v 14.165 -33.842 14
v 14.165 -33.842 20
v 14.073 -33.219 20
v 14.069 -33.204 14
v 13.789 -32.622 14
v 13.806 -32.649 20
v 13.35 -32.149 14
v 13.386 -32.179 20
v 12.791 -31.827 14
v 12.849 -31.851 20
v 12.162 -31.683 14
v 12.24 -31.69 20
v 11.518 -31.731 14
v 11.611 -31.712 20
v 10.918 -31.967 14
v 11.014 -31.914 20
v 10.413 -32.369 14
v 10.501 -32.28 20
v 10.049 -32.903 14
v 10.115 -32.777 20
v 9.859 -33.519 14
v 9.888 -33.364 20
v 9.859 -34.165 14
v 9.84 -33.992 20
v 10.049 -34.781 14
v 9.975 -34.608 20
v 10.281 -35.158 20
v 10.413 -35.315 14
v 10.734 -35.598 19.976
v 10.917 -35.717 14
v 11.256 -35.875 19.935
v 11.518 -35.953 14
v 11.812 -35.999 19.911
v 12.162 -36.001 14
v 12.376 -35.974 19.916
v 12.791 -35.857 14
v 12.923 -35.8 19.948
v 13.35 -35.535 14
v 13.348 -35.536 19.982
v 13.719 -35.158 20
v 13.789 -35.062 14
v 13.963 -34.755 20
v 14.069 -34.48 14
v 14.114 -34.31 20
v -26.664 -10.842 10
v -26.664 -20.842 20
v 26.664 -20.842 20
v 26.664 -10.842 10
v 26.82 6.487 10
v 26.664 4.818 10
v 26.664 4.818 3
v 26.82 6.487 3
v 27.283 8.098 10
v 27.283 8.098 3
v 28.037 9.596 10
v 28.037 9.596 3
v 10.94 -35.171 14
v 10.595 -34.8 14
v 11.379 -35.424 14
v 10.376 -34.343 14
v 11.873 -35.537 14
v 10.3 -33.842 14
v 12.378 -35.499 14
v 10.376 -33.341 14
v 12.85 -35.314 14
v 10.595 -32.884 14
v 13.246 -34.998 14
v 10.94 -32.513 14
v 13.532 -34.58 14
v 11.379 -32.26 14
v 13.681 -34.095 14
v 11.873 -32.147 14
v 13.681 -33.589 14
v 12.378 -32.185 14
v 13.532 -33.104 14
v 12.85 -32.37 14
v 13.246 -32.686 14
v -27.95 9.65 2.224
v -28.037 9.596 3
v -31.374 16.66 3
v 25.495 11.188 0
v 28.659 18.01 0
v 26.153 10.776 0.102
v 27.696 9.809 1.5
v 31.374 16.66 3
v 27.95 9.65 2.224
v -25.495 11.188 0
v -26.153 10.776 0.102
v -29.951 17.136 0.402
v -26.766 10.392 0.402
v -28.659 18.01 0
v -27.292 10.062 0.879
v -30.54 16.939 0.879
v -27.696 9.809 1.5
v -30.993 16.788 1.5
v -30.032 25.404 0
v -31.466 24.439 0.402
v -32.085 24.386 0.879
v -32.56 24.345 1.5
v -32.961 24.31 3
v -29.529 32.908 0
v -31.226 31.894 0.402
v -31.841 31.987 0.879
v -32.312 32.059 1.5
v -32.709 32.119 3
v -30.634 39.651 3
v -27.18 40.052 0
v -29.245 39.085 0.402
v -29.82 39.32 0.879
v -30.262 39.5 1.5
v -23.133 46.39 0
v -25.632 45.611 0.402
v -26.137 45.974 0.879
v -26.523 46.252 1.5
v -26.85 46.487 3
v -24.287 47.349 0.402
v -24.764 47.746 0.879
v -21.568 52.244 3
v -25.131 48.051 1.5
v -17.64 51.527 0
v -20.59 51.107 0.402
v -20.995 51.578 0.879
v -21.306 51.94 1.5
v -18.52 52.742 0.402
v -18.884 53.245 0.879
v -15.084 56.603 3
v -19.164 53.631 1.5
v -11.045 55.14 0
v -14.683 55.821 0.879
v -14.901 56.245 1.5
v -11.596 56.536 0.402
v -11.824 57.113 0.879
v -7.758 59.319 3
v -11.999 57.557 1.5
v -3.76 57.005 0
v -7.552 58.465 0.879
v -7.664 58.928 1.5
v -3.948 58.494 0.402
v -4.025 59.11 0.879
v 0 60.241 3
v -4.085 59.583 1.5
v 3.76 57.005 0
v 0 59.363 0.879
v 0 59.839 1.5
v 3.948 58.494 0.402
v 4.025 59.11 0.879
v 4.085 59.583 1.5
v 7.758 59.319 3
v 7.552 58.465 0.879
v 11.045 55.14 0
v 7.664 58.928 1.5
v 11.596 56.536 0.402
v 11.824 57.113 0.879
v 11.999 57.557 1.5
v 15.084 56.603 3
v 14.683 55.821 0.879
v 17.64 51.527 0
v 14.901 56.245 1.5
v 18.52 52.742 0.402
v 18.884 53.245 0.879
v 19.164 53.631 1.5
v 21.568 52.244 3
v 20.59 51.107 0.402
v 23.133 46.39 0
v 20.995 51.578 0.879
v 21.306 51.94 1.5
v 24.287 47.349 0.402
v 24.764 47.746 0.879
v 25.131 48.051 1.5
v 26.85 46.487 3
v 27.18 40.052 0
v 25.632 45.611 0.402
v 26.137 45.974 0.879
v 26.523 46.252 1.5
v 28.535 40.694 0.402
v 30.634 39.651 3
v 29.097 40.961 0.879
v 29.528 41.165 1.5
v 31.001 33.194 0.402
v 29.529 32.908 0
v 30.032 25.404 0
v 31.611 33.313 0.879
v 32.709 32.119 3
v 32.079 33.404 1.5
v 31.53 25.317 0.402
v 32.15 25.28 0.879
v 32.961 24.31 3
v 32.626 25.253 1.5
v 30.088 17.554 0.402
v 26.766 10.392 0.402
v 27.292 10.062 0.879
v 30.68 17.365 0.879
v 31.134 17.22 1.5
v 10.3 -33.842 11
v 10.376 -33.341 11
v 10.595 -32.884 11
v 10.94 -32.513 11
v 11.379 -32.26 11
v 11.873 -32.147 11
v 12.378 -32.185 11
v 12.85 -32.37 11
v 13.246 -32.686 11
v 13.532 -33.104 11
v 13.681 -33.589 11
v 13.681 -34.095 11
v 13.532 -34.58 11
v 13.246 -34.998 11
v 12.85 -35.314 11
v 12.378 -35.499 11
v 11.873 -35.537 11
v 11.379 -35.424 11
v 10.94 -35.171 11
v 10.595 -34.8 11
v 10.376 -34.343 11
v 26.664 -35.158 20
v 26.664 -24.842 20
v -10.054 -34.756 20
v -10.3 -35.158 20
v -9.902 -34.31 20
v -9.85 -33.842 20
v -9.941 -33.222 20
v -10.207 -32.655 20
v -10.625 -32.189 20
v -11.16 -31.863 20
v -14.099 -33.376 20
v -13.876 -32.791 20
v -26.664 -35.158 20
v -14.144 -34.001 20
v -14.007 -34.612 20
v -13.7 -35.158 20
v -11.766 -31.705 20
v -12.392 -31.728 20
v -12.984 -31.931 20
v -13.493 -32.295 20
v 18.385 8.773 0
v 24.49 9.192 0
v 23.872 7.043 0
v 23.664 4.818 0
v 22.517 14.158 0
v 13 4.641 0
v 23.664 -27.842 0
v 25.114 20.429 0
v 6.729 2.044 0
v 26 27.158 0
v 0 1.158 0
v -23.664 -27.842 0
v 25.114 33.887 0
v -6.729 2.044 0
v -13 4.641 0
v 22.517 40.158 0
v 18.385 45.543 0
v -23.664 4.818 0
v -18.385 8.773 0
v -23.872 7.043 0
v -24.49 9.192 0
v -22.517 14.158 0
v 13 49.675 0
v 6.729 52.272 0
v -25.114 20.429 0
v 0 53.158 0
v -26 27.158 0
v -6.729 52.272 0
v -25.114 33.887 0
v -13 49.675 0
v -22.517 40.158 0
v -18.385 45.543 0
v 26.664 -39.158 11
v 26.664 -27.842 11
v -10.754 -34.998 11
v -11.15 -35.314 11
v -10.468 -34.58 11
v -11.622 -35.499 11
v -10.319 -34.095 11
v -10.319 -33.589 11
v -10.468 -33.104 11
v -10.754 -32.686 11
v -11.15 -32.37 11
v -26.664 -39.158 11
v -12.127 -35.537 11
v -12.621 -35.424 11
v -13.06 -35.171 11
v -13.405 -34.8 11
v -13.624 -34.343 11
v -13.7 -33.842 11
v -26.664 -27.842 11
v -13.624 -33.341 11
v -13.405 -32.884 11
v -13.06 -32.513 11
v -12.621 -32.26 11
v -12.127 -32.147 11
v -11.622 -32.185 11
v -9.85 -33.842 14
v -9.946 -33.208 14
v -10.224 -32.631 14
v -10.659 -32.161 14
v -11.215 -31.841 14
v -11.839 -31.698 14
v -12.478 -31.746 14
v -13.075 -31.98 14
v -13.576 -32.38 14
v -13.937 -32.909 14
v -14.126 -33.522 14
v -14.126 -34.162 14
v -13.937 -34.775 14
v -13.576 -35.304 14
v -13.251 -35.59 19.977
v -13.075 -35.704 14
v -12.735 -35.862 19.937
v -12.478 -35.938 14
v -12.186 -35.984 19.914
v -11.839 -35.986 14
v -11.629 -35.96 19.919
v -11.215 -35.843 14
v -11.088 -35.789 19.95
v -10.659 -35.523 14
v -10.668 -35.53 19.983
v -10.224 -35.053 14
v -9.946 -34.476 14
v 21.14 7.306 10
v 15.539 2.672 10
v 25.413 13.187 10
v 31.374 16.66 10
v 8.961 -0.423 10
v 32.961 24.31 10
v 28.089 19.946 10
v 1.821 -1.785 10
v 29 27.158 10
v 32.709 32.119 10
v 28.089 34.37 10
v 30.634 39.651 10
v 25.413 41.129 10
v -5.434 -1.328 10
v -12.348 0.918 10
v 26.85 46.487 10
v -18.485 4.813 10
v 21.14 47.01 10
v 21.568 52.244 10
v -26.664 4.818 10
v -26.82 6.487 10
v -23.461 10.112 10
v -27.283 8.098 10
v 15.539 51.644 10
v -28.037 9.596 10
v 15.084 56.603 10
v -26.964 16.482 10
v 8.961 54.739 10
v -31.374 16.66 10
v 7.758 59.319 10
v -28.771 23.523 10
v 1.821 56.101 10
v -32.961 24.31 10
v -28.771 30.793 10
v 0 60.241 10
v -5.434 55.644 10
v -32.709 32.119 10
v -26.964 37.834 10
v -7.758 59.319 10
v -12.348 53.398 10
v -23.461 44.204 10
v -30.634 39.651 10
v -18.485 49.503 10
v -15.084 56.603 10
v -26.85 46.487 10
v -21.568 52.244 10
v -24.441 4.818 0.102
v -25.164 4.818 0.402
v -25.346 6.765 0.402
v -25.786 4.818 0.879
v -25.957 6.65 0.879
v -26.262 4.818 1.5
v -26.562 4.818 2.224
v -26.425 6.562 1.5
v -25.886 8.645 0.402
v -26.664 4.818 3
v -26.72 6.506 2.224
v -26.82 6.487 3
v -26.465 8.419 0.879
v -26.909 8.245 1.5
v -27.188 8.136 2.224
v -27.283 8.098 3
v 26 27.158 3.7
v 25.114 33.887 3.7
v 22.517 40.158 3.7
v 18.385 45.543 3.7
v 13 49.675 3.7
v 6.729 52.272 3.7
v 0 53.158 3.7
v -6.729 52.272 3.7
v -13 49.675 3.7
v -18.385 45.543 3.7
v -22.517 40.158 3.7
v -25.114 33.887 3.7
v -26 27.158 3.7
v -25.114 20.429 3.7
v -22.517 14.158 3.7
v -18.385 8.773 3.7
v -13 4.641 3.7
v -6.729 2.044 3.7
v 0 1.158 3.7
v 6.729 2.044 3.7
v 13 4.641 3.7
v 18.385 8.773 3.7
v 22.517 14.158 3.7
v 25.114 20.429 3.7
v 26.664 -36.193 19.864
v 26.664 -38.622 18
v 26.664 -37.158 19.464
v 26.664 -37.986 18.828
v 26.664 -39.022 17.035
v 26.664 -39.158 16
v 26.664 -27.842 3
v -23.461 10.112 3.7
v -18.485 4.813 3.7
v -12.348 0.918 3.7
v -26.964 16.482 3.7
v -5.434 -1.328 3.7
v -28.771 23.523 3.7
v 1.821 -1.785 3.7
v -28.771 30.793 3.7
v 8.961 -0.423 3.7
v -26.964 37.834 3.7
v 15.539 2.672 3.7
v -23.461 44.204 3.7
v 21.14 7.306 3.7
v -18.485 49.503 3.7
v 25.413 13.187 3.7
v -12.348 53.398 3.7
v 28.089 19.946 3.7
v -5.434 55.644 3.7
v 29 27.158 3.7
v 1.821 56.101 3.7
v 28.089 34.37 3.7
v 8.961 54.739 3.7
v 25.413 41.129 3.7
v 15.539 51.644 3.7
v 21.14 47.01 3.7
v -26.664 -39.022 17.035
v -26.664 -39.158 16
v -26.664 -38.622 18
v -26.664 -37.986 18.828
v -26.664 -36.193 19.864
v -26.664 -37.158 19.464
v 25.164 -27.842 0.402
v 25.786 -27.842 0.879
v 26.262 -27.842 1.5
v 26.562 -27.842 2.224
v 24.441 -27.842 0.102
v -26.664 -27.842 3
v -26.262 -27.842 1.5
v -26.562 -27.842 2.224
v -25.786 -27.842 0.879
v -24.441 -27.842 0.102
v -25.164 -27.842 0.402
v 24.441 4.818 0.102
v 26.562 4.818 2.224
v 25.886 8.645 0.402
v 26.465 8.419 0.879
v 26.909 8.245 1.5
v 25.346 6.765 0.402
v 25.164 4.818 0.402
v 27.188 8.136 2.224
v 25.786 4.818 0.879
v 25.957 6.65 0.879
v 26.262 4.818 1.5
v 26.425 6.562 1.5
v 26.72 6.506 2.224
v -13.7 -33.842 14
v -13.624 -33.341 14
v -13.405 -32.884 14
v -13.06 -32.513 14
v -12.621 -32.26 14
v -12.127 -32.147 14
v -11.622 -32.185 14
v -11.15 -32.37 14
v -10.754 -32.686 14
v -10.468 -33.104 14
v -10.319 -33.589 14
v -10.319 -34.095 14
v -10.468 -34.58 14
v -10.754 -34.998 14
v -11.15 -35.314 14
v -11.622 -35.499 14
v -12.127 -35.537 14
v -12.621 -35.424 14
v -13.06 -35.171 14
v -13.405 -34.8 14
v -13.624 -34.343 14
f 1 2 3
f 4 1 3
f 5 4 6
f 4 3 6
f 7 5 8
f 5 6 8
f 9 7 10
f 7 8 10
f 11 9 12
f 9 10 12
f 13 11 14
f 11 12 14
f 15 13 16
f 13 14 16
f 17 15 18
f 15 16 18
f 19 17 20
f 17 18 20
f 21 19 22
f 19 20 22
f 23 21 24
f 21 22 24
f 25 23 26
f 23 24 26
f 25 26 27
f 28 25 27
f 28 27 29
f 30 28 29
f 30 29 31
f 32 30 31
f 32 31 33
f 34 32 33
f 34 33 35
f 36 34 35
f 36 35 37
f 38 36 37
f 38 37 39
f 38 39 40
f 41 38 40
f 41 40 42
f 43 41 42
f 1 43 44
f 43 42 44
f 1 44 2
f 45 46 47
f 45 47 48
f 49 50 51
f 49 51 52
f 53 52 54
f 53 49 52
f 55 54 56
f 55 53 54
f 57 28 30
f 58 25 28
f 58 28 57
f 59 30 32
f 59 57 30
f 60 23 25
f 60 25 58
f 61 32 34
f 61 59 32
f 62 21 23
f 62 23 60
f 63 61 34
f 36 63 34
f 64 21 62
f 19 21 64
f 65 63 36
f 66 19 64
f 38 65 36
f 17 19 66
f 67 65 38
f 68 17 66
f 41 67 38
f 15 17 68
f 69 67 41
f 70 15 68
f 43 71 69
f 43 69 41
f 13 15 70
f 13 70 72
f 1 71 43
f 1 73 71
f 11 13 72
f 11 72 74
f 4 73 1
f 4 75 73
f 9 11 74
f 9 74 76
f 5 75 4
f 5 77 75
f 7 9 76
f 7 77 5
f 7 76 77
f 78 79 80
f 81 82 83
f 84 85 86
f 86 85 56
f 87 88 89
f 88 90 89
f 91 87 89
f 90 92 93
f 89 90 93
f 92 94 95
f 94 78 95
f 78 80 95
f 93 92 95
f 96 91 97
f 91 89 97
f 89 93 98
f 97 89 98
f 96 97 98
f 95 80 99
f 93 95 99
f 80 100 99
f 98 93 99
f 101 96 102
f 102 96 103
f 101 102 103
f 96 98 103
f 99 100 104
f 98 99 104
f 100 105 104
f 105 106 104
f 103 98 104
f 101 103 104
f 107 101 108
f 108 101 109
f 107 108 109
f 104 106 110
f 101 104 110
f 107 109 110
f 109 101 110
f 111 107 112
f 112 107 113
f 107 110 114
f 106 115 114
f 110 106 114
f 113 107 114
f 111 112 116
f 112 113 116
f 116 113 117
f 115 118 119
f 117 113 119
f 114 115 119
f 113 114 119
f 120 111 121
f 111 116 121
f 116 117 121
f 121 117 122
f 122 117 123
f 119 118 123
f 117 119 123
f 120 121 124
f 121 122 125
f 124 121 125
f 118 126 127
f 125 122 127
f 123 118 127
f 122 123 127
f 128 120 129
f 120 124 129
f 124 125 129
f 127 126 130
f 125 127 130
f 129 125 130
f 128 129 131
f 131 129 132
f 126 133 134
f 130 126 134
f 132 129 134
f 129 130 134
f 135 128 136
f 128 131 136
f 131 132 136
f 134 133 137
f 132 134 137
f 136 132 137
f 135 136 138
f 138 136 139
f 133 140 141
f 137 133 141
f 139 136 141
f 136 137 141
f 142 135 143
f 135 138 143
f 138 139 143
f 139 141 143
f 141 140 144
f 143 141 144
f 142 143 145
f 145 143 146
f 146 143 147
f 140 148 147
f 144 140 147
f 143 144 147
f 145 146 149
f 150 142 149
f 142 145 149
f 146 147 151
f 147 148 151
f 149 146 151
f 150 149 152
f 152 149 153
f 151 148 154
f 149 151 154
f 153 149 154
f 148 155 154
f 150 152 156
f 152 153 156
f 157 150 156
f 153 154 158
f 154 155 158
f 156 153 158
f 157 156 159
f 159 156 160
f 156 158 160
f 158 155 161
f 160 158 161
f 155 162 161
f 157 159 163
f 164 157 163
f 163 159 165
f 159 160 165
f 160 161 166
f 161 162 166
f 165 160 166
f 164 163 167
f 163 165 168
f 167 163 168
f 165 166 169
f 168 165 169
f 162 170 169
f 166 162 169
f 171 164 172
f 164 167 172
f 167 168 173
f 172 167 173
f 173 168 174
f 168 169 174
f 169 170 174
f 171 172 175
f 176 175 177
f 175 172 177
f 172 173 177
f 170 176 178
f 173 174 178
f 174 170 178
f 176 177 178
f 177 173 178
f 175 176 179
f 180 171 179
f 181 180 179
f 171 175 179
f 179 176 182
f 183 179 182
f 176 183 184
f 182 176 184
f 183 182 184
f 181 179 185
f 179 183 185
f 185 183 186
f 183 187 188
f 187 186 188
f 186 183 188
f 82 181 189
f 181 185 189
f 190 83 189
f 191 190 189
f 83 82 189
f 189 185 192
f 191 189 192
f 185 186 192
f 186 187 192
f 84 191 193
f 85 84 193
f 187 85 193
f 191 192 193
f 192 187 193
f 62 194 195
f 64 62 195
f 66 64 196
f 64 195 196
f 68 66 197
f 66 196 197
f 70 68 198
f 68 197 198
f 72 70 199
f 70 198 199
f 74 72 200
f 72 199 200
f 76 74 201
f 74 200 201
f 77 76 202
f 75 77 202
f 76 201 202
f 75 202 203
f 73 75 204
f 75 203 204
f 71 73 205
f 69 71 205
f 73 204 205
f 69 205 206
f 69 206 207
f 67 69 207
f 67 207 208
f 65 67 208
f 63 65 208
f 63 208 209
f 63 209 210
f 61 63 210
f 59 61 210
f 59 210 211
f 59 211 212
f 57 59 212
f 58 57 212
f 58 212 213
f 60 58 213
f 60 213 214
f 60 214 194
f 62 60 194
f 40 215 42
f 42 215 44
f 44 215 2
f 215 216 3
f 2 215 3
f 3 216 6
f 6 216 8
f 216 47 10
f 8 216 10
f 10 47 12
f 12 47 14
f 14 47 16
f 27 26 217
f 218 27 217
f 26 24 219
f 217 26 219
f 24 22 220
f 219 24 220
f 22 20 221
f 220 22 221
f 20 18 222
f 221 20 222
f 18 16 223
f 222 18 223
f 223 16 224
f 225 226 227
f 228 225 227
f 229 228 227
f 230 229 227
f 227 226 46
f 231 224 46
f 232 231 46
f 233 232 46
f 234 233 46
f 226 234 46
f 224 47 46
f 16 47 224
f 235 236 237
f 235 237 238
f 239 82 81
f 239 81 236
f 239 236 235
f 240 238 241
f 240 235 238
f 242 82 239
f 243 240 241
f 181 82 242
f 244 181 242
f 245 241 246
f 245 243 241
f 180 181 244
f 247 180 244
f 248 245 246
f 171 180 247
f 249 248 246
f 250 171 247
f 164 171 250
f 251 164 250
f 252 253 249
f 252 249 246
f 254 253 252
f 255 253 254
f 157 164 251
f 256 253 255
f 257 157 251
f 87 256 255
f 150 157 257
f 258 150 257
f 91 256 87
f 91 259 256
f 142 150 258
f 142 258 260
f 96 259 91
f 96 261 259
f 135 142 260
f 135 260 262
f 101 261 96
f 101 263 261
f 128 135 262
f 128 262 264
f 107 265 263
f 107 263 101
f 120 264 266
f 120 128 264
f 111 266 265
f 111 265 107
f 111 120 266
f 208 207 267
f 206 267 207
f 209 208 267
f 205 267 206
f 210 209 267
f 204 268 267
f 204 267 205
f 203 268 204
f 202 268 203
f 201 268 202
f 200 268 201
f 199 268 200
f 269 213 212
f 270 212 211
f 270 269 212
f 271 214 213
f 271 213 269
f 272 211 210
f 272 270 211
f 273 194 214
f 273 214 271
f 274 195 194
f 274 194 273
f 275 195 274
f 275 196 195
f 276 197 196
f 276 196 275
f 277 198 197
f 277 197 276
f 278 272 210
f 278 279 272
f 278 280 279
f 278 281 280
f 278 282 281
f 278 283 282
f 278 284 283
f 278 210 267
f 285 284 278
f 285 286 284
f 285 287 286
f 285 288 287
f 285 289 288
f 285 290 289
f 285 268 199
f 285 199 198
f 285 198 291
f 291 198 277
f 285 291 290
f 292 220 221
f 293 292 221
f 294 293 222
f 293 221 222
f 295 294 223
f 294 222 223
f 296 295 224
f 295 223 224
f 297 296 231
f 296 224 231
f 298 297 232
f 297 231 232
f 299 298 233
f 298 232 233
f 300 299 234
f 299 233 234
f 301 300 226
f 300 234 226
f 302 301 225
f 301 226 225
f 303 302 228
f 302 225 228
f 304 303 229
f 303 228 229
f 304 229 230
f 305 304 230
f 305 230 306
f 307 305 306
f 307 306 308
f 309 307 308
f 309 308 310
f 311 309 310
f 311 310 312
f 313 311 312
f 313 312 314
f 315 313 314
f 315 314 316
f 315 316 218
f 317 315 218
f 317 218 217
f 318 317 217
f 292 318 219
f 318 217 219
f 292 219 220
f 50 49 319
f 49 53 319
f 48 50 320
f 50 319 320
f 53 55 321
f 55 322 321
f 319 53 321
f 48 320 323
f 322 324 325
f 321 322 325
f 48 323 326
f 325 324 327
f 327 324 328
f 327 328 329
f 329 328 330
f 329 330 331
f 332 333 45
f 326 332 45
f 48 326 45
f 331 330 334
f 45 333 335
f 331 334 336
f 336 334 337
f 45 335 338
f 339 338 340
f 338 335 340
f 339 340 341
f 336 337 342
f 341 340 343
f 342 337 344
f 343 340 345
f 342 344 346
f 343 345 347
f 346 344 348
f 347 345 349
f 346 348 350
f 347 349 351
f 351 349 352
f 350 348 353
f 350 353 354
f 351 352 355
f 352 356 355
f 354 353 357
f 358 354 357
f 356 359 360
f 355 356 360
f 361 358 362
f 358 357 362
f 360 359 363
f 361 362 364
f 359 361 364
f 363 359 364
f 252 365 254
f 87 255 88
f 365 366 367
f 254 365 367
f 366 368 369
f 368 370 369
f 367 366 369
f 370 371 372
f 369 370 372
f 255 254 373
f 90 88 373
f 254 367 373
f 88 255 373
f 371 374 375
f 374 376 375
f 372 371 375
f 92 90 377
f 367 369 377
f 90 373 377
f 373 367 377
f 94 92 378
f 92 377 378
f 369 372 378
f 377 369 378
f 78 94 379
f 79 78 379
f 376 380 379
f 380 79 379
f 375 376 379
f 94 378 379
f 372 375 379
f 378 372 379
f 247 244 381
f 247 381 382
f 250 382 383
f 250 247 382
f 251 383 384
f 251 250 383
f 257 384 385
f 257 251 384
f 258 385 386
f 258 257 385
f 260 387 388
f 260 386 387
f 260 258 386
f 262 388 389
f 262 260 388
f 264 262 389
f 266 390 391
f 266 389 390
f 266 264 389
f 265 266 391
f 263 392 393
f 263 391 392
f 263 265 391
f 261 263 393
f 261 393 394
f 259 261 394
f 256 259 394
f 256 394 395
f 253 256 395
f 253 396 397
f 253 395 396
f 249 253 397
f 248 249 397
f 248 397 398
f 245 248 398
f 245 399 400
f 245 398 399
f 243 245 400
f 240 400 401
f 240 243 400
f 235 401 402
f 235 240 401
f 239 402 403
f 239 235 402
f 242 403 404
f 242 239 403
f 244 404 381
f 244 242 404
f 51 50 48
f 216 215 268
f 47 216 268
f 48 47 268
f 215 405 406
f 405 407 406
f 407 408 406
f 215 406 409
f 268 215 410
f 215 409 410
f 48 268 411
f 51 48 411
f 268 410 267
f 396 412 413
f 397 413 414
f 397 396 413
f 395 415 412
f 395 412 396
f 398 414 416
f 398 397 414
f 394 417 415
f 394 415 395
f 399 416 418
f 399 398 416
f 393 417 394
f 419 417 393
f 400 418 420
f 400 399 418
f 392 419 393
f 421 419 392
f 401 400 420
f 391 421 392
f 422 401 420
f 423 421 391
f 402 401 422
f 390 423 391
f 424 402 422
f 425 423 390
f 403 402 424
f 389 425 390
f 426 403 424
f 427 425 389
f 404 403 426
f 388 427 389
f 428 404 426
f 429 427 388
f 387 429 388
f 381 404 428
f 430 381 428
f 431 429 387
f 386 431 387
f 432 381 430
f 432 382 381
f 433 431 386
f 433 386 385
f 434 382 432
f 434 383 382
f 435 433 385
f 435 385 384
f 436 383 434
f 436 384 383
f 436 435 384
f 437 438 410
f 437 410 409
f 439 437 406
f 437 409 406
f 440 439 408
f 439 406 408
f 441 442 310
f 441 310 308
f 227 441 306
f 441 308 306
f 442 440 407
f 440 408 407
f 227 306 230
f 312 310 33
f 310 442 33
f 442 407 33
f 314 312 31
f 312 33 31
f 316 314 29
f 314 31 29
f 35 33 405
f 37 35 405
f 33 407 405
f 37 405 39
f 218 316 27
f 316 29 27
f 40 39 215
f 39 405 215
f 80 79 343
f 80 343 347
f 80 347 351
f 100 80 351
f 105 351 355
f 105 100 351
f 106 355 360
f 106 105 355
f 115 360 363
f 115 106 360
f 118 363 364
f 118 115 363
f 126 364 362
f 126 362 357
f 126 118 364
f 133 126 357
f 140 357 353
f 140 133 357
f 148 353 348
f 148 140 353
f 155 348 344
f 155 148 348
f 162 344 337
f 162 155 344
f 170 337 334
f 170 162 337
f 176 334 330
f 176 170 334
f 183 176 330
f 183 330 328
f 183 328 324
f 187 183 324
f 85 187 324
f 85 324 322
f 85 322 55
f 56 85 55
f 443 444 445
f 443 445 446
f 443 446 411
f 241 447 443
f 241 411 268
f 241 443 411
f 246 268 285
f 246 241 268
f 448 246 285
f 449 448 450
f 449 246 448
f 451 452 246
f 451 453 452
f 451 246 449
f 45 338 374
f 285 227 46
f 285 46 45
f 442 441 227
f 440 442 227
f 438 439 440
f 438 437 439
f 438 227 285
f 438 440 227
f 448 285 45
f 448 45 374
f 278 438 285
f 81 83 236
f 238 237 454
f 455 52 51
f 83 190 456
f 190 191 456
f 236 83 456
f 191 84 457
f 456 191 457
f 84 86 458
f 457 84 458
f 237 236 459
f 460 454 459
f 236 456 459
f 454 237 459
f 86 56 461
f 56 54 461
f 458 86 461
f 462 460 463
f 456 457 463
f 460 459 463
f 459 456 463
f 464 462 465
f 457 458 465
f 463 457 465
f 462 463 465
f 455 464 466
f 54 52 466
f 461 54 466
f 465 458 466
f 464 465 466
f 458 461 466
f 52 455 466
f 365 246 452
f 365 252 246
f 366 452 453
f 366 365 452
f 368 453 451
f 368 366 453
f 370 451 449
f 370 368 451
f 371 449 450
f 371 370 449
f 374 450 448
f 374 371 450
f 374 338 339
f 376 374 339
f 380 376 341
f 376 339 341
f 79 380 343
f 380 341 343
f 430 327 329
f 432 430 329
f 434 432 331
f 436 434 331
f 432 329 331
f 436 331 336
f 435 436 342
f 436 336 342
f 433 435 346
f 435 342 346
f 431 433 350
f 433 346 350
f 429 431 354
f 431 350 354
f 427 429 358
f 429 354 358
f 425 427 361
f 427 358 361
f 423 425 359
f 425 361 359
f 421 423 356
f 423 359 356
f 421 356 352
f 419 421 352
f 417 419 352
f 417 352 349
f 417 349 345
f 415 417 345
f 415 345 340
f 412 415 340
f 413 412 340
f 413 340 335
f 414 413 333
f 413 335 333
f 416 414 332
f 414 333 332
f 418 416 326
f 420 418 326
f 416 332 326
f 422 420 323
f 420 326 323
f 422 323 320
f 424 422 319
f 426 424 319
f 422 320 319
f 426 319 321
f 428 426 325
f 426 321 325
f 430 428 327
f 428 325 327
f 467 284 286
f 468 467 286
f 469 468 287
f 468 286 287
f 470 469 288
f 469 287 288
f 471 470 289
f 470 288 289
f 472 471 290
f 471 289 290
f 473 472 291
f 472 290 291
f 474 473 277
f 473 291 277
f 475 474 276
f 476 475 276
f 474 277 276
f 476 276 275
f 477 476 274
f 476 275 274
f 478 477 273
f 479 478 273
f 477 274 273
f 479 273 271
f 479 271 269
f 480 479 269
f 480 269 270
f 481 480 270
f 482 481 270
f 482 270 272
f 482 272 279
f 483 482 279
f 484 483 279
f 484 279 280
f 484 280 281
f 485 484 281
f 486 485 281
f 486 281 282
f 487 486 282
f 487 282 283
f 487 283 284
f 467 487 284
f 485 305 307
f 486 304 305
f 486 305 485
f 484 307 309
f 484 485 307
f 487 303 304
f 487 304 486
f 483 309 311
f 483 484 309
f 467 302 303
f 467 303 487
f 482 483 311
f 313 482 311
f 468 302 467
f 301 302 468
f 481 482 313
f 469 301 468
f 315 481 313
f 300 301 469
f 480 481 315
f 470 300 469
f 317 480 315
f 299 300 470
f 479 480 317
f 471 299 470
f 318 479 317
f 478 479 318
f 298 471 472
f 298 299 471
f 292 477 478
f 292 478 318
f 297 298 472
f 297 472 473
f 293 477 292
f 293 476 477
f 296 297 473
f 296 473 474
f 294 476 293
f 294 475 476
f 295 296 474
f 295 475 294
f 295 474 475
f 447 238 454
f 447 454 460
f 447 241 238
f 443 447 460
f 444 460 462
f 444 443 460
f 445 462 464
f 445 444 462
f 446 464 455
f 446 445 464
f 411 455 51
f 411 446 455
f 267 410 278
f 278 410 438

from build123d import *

# Parameters (mm, degrees)
SKETCH_1_R          = 26
EXTRUDE_1_DEPTH     = 10
SKETCH_3_R          = 29
CUT_EXTRUDE_1_DEPTH = 6.3
FILLET_1_R          = 9
SKETCH_4_W          = 53.328443722
SKETCH_4_H          = 11.316007496
EXTRUDE_2_DEPTH     = 10
SKETCH_5_W          = 53.328443722
SKETCH_5_H          = 11.316007496
EXTRUDE_3_DEPTH     = 2
SKETCH_6_W          = 53.328443722
SKETCH_6_H          = 10
EXTRUDE_4_DEPTH     = 3
CHAMFER_1_SIZE      = 14
FILLET_3_R          = 3
SKETCH_7_R          = 1.7
CUT_EXTRUDE_2_DEPTH = 14
SKETCH_8_R          = 2.15
SKETCH_8_R_2        = 2.165
CUT_EXTRUDE_3_DEPTH = 6
SKETCH_9_W          = 53.328443722
SKETCH_9_H          = 11.316007496
CUT_EXTRUDE_4_DEPTH = 3
FILLET_4_R          = 4


with BuildPart() as part:
    # 草图1 → 凸台-拉伸1 (new body)
    with BuildSketch(Plane.XY):
        with BuildLine():
            Line((26.664221861, -27.841996252), (-26.664221861, -27.841996252))
            Line((-26.664221861, -27.841996252), (-26.664221861, 7.574088737))
            ThreePointArc((-26.664221861, 7.574088737), (0, 60.241390131), (26.664221861, 7.574088737))
            Line((26.664221861, 7.574088737), (26.664221861, -27.841996252))
        make_face()
        with Locations((0, 27.158003748)):
            Circle(SKETCH_1_R, mode=Mode.SUBTRACT)
    extrude(amount=EXTRUDE_1_DEPTH)

    # 草图3 → 切除-拉伸1 (cut)
    with BuildSketch(Plane.XY.offset(10)):
        with Locations((0, 27.158003748)):
            Circle(SKETCH_3_R)
    extrude(amount=-CUT_EXTRUDE_1_DEPTH, mode=Mode.SUBTRACT)

    # 圆角1
    fillet_1_edges = [part.edges().sort_by_distance(p)[0] for p in [
        (-26.664221861, 7.574088737, 5),
        (26.664221861, 7.574088737, 5),
    ]]
    fillet(fillet_1_edges, radius=FILLET_1_R)



with BuildPart() as body_2:
    # 草图4 → 凸台-拉伸2 (new body)
    with BuildSketch(Plane.XY.offset(10)):
        with Locations((0, -33.5)):
            Rectangle(SKETCH_4_W, SKETCH_4_H)
    extrude(amount=EXTRUDE_2_DEPTH)


with BuildPart() as part_1:
    add(part.part)

    add(body_2.part)  # 凸台-拉伸3 merges body 2
    # 草图5 → 凸台-拉伸3 (add)
    with BuildSketch(Plane(origin=(0, 0, 10), x_dir=(-1, 0, 0), z_dir=(0, 0, -1))):
        with Locations((0, -33.5)):
            Rectangle(SKETCH_5_W, SKETCH_5_H)
    extrude(amount=EXTRUDE_3_DEPTH)

    # 草图6 → 凸台-拉伸4 (add)
    with BuildSketch(Plane(origin=(0, -27.841996252, 0), x_dir=(1, 0, 0), z_dir=(0, 1, 0))):
        with Locations((0, -15)):
            Rectangle(SKETCH_6_W, SKETCH_6_H)
    extrude(amount=EXTRUDE_4_DEPTH)

    # 倒角1
    # the kernel refuses this chamfer: 14 mm, written as the material it adds along each edge
    with BuildSketch(Plane(origin=(-26.664221861, -24.841996252, 10), x_dir=(0, -0.027495876610586365, 0.9996219169112968), z_dir=(1, 0, 0))) as chamfer_1_piece_1_section:
        Polygon((CHAMFER_1_SIZE * 0.999621916911, -CHAMFER_1_SIZE * 0.0274958766106), (-CHAMFER_1_SIZE * 0.0274958766106, -CHAMFER_1_SIZE * 0.999621916911), (0, 0), align=None)
    chamfer_1_piece_1 = extrude(amount=53.328443723, mode=Mode.PRIVATE)
    chamfer_1_piece_1 = split(chamfer_1_piece_1, bisect_by=Plane(origin=(0, -19.845516644, 20), z_dir=(0, 0, -1)), keep=Keep.TOP, mode=Mode.PRIVATE)
    add(chamfer_1_piece_1)

    # 圆角3
    fillet_3_edges = [part_1.edges().sort_by_distance(p)[0] for p in [
        (-26.664221861, -11.511986052, 0),
        (0, 60.241390131, 0),
        (-27.014230163, 7.303510743, 0),
        (27.014230163, 7.303510743, 0),
        (26.664221861, -11.511986052, 0),
    ]]
    fillet(fillet_3_edges, radius=FILLET_3_R)

    # 草图7 → 切除-拉伸2 (cut)
    with BuildSketch(Plane(origin=(0, 0, 8), x_dir=(-1, 0, 0), z_dir=(0, 0, -1))):
        with Locations((-12, -33.841996252)):
            Circle(SKETCH_7_R)
        with Locations((12, -33.841996252)):
            Circle(SKETCH_7_R)
    extrude(amount=-CUT_EXTRUDE_2_DEPTH, mode=Mode.SUBTRACT)

    # 草图8 → 切除-拉伸3 (cut)
    with BuildSketch(Plane.XY.offset(20)):
        with Locations((-12, -33.841996252)):
            Circle(SKETCH_8_R)
        with Locations((12, -33.841996252)):
            Circle(SKETCH_8_R_2)
    extrude(amount=-CUT_EXTRUDE_3_DEPTH, mode=Mode.SUBTRACT)

    # 草图9 → 切除-拉伸4 (cut)
    with BuildSketch(Plane(origin=(0, 0, 8), x_dir=(-1, 0, 0), z_dir=(0, 0, -1))):
        with Locations((0, -33.5)):
            Rectangle(SKETCH_9_W, SKETCH_9_H)
    extrude(amount=-CUT_EXTRUDE_4_DEPTH, mode=Mode.SUBTRACT)

    # 圆角4
    # the kernel refuses this fillet: 4 mm, written as the material it takes off along each edge
    with BuildSketch(Plane(origin=(36.664221861, -39.158003748, 20), x_dir=(0, 1, 0), z_dir=(-1, 0, 0))) as fillet_4_piece_1:
        with BuildLine():
            CenterArc((FILLET_4_R, FILLET_4_R), FILLET_4_R, 180, 90)
            Line((0, FILLET_4_R), (0, 0))
            Line((0, 0), (FILLET_4_R, 0))
        make_face()
    extrude(amount=73.328443723, mode=Mode.SUBTRACT)


solid = part_1.part
